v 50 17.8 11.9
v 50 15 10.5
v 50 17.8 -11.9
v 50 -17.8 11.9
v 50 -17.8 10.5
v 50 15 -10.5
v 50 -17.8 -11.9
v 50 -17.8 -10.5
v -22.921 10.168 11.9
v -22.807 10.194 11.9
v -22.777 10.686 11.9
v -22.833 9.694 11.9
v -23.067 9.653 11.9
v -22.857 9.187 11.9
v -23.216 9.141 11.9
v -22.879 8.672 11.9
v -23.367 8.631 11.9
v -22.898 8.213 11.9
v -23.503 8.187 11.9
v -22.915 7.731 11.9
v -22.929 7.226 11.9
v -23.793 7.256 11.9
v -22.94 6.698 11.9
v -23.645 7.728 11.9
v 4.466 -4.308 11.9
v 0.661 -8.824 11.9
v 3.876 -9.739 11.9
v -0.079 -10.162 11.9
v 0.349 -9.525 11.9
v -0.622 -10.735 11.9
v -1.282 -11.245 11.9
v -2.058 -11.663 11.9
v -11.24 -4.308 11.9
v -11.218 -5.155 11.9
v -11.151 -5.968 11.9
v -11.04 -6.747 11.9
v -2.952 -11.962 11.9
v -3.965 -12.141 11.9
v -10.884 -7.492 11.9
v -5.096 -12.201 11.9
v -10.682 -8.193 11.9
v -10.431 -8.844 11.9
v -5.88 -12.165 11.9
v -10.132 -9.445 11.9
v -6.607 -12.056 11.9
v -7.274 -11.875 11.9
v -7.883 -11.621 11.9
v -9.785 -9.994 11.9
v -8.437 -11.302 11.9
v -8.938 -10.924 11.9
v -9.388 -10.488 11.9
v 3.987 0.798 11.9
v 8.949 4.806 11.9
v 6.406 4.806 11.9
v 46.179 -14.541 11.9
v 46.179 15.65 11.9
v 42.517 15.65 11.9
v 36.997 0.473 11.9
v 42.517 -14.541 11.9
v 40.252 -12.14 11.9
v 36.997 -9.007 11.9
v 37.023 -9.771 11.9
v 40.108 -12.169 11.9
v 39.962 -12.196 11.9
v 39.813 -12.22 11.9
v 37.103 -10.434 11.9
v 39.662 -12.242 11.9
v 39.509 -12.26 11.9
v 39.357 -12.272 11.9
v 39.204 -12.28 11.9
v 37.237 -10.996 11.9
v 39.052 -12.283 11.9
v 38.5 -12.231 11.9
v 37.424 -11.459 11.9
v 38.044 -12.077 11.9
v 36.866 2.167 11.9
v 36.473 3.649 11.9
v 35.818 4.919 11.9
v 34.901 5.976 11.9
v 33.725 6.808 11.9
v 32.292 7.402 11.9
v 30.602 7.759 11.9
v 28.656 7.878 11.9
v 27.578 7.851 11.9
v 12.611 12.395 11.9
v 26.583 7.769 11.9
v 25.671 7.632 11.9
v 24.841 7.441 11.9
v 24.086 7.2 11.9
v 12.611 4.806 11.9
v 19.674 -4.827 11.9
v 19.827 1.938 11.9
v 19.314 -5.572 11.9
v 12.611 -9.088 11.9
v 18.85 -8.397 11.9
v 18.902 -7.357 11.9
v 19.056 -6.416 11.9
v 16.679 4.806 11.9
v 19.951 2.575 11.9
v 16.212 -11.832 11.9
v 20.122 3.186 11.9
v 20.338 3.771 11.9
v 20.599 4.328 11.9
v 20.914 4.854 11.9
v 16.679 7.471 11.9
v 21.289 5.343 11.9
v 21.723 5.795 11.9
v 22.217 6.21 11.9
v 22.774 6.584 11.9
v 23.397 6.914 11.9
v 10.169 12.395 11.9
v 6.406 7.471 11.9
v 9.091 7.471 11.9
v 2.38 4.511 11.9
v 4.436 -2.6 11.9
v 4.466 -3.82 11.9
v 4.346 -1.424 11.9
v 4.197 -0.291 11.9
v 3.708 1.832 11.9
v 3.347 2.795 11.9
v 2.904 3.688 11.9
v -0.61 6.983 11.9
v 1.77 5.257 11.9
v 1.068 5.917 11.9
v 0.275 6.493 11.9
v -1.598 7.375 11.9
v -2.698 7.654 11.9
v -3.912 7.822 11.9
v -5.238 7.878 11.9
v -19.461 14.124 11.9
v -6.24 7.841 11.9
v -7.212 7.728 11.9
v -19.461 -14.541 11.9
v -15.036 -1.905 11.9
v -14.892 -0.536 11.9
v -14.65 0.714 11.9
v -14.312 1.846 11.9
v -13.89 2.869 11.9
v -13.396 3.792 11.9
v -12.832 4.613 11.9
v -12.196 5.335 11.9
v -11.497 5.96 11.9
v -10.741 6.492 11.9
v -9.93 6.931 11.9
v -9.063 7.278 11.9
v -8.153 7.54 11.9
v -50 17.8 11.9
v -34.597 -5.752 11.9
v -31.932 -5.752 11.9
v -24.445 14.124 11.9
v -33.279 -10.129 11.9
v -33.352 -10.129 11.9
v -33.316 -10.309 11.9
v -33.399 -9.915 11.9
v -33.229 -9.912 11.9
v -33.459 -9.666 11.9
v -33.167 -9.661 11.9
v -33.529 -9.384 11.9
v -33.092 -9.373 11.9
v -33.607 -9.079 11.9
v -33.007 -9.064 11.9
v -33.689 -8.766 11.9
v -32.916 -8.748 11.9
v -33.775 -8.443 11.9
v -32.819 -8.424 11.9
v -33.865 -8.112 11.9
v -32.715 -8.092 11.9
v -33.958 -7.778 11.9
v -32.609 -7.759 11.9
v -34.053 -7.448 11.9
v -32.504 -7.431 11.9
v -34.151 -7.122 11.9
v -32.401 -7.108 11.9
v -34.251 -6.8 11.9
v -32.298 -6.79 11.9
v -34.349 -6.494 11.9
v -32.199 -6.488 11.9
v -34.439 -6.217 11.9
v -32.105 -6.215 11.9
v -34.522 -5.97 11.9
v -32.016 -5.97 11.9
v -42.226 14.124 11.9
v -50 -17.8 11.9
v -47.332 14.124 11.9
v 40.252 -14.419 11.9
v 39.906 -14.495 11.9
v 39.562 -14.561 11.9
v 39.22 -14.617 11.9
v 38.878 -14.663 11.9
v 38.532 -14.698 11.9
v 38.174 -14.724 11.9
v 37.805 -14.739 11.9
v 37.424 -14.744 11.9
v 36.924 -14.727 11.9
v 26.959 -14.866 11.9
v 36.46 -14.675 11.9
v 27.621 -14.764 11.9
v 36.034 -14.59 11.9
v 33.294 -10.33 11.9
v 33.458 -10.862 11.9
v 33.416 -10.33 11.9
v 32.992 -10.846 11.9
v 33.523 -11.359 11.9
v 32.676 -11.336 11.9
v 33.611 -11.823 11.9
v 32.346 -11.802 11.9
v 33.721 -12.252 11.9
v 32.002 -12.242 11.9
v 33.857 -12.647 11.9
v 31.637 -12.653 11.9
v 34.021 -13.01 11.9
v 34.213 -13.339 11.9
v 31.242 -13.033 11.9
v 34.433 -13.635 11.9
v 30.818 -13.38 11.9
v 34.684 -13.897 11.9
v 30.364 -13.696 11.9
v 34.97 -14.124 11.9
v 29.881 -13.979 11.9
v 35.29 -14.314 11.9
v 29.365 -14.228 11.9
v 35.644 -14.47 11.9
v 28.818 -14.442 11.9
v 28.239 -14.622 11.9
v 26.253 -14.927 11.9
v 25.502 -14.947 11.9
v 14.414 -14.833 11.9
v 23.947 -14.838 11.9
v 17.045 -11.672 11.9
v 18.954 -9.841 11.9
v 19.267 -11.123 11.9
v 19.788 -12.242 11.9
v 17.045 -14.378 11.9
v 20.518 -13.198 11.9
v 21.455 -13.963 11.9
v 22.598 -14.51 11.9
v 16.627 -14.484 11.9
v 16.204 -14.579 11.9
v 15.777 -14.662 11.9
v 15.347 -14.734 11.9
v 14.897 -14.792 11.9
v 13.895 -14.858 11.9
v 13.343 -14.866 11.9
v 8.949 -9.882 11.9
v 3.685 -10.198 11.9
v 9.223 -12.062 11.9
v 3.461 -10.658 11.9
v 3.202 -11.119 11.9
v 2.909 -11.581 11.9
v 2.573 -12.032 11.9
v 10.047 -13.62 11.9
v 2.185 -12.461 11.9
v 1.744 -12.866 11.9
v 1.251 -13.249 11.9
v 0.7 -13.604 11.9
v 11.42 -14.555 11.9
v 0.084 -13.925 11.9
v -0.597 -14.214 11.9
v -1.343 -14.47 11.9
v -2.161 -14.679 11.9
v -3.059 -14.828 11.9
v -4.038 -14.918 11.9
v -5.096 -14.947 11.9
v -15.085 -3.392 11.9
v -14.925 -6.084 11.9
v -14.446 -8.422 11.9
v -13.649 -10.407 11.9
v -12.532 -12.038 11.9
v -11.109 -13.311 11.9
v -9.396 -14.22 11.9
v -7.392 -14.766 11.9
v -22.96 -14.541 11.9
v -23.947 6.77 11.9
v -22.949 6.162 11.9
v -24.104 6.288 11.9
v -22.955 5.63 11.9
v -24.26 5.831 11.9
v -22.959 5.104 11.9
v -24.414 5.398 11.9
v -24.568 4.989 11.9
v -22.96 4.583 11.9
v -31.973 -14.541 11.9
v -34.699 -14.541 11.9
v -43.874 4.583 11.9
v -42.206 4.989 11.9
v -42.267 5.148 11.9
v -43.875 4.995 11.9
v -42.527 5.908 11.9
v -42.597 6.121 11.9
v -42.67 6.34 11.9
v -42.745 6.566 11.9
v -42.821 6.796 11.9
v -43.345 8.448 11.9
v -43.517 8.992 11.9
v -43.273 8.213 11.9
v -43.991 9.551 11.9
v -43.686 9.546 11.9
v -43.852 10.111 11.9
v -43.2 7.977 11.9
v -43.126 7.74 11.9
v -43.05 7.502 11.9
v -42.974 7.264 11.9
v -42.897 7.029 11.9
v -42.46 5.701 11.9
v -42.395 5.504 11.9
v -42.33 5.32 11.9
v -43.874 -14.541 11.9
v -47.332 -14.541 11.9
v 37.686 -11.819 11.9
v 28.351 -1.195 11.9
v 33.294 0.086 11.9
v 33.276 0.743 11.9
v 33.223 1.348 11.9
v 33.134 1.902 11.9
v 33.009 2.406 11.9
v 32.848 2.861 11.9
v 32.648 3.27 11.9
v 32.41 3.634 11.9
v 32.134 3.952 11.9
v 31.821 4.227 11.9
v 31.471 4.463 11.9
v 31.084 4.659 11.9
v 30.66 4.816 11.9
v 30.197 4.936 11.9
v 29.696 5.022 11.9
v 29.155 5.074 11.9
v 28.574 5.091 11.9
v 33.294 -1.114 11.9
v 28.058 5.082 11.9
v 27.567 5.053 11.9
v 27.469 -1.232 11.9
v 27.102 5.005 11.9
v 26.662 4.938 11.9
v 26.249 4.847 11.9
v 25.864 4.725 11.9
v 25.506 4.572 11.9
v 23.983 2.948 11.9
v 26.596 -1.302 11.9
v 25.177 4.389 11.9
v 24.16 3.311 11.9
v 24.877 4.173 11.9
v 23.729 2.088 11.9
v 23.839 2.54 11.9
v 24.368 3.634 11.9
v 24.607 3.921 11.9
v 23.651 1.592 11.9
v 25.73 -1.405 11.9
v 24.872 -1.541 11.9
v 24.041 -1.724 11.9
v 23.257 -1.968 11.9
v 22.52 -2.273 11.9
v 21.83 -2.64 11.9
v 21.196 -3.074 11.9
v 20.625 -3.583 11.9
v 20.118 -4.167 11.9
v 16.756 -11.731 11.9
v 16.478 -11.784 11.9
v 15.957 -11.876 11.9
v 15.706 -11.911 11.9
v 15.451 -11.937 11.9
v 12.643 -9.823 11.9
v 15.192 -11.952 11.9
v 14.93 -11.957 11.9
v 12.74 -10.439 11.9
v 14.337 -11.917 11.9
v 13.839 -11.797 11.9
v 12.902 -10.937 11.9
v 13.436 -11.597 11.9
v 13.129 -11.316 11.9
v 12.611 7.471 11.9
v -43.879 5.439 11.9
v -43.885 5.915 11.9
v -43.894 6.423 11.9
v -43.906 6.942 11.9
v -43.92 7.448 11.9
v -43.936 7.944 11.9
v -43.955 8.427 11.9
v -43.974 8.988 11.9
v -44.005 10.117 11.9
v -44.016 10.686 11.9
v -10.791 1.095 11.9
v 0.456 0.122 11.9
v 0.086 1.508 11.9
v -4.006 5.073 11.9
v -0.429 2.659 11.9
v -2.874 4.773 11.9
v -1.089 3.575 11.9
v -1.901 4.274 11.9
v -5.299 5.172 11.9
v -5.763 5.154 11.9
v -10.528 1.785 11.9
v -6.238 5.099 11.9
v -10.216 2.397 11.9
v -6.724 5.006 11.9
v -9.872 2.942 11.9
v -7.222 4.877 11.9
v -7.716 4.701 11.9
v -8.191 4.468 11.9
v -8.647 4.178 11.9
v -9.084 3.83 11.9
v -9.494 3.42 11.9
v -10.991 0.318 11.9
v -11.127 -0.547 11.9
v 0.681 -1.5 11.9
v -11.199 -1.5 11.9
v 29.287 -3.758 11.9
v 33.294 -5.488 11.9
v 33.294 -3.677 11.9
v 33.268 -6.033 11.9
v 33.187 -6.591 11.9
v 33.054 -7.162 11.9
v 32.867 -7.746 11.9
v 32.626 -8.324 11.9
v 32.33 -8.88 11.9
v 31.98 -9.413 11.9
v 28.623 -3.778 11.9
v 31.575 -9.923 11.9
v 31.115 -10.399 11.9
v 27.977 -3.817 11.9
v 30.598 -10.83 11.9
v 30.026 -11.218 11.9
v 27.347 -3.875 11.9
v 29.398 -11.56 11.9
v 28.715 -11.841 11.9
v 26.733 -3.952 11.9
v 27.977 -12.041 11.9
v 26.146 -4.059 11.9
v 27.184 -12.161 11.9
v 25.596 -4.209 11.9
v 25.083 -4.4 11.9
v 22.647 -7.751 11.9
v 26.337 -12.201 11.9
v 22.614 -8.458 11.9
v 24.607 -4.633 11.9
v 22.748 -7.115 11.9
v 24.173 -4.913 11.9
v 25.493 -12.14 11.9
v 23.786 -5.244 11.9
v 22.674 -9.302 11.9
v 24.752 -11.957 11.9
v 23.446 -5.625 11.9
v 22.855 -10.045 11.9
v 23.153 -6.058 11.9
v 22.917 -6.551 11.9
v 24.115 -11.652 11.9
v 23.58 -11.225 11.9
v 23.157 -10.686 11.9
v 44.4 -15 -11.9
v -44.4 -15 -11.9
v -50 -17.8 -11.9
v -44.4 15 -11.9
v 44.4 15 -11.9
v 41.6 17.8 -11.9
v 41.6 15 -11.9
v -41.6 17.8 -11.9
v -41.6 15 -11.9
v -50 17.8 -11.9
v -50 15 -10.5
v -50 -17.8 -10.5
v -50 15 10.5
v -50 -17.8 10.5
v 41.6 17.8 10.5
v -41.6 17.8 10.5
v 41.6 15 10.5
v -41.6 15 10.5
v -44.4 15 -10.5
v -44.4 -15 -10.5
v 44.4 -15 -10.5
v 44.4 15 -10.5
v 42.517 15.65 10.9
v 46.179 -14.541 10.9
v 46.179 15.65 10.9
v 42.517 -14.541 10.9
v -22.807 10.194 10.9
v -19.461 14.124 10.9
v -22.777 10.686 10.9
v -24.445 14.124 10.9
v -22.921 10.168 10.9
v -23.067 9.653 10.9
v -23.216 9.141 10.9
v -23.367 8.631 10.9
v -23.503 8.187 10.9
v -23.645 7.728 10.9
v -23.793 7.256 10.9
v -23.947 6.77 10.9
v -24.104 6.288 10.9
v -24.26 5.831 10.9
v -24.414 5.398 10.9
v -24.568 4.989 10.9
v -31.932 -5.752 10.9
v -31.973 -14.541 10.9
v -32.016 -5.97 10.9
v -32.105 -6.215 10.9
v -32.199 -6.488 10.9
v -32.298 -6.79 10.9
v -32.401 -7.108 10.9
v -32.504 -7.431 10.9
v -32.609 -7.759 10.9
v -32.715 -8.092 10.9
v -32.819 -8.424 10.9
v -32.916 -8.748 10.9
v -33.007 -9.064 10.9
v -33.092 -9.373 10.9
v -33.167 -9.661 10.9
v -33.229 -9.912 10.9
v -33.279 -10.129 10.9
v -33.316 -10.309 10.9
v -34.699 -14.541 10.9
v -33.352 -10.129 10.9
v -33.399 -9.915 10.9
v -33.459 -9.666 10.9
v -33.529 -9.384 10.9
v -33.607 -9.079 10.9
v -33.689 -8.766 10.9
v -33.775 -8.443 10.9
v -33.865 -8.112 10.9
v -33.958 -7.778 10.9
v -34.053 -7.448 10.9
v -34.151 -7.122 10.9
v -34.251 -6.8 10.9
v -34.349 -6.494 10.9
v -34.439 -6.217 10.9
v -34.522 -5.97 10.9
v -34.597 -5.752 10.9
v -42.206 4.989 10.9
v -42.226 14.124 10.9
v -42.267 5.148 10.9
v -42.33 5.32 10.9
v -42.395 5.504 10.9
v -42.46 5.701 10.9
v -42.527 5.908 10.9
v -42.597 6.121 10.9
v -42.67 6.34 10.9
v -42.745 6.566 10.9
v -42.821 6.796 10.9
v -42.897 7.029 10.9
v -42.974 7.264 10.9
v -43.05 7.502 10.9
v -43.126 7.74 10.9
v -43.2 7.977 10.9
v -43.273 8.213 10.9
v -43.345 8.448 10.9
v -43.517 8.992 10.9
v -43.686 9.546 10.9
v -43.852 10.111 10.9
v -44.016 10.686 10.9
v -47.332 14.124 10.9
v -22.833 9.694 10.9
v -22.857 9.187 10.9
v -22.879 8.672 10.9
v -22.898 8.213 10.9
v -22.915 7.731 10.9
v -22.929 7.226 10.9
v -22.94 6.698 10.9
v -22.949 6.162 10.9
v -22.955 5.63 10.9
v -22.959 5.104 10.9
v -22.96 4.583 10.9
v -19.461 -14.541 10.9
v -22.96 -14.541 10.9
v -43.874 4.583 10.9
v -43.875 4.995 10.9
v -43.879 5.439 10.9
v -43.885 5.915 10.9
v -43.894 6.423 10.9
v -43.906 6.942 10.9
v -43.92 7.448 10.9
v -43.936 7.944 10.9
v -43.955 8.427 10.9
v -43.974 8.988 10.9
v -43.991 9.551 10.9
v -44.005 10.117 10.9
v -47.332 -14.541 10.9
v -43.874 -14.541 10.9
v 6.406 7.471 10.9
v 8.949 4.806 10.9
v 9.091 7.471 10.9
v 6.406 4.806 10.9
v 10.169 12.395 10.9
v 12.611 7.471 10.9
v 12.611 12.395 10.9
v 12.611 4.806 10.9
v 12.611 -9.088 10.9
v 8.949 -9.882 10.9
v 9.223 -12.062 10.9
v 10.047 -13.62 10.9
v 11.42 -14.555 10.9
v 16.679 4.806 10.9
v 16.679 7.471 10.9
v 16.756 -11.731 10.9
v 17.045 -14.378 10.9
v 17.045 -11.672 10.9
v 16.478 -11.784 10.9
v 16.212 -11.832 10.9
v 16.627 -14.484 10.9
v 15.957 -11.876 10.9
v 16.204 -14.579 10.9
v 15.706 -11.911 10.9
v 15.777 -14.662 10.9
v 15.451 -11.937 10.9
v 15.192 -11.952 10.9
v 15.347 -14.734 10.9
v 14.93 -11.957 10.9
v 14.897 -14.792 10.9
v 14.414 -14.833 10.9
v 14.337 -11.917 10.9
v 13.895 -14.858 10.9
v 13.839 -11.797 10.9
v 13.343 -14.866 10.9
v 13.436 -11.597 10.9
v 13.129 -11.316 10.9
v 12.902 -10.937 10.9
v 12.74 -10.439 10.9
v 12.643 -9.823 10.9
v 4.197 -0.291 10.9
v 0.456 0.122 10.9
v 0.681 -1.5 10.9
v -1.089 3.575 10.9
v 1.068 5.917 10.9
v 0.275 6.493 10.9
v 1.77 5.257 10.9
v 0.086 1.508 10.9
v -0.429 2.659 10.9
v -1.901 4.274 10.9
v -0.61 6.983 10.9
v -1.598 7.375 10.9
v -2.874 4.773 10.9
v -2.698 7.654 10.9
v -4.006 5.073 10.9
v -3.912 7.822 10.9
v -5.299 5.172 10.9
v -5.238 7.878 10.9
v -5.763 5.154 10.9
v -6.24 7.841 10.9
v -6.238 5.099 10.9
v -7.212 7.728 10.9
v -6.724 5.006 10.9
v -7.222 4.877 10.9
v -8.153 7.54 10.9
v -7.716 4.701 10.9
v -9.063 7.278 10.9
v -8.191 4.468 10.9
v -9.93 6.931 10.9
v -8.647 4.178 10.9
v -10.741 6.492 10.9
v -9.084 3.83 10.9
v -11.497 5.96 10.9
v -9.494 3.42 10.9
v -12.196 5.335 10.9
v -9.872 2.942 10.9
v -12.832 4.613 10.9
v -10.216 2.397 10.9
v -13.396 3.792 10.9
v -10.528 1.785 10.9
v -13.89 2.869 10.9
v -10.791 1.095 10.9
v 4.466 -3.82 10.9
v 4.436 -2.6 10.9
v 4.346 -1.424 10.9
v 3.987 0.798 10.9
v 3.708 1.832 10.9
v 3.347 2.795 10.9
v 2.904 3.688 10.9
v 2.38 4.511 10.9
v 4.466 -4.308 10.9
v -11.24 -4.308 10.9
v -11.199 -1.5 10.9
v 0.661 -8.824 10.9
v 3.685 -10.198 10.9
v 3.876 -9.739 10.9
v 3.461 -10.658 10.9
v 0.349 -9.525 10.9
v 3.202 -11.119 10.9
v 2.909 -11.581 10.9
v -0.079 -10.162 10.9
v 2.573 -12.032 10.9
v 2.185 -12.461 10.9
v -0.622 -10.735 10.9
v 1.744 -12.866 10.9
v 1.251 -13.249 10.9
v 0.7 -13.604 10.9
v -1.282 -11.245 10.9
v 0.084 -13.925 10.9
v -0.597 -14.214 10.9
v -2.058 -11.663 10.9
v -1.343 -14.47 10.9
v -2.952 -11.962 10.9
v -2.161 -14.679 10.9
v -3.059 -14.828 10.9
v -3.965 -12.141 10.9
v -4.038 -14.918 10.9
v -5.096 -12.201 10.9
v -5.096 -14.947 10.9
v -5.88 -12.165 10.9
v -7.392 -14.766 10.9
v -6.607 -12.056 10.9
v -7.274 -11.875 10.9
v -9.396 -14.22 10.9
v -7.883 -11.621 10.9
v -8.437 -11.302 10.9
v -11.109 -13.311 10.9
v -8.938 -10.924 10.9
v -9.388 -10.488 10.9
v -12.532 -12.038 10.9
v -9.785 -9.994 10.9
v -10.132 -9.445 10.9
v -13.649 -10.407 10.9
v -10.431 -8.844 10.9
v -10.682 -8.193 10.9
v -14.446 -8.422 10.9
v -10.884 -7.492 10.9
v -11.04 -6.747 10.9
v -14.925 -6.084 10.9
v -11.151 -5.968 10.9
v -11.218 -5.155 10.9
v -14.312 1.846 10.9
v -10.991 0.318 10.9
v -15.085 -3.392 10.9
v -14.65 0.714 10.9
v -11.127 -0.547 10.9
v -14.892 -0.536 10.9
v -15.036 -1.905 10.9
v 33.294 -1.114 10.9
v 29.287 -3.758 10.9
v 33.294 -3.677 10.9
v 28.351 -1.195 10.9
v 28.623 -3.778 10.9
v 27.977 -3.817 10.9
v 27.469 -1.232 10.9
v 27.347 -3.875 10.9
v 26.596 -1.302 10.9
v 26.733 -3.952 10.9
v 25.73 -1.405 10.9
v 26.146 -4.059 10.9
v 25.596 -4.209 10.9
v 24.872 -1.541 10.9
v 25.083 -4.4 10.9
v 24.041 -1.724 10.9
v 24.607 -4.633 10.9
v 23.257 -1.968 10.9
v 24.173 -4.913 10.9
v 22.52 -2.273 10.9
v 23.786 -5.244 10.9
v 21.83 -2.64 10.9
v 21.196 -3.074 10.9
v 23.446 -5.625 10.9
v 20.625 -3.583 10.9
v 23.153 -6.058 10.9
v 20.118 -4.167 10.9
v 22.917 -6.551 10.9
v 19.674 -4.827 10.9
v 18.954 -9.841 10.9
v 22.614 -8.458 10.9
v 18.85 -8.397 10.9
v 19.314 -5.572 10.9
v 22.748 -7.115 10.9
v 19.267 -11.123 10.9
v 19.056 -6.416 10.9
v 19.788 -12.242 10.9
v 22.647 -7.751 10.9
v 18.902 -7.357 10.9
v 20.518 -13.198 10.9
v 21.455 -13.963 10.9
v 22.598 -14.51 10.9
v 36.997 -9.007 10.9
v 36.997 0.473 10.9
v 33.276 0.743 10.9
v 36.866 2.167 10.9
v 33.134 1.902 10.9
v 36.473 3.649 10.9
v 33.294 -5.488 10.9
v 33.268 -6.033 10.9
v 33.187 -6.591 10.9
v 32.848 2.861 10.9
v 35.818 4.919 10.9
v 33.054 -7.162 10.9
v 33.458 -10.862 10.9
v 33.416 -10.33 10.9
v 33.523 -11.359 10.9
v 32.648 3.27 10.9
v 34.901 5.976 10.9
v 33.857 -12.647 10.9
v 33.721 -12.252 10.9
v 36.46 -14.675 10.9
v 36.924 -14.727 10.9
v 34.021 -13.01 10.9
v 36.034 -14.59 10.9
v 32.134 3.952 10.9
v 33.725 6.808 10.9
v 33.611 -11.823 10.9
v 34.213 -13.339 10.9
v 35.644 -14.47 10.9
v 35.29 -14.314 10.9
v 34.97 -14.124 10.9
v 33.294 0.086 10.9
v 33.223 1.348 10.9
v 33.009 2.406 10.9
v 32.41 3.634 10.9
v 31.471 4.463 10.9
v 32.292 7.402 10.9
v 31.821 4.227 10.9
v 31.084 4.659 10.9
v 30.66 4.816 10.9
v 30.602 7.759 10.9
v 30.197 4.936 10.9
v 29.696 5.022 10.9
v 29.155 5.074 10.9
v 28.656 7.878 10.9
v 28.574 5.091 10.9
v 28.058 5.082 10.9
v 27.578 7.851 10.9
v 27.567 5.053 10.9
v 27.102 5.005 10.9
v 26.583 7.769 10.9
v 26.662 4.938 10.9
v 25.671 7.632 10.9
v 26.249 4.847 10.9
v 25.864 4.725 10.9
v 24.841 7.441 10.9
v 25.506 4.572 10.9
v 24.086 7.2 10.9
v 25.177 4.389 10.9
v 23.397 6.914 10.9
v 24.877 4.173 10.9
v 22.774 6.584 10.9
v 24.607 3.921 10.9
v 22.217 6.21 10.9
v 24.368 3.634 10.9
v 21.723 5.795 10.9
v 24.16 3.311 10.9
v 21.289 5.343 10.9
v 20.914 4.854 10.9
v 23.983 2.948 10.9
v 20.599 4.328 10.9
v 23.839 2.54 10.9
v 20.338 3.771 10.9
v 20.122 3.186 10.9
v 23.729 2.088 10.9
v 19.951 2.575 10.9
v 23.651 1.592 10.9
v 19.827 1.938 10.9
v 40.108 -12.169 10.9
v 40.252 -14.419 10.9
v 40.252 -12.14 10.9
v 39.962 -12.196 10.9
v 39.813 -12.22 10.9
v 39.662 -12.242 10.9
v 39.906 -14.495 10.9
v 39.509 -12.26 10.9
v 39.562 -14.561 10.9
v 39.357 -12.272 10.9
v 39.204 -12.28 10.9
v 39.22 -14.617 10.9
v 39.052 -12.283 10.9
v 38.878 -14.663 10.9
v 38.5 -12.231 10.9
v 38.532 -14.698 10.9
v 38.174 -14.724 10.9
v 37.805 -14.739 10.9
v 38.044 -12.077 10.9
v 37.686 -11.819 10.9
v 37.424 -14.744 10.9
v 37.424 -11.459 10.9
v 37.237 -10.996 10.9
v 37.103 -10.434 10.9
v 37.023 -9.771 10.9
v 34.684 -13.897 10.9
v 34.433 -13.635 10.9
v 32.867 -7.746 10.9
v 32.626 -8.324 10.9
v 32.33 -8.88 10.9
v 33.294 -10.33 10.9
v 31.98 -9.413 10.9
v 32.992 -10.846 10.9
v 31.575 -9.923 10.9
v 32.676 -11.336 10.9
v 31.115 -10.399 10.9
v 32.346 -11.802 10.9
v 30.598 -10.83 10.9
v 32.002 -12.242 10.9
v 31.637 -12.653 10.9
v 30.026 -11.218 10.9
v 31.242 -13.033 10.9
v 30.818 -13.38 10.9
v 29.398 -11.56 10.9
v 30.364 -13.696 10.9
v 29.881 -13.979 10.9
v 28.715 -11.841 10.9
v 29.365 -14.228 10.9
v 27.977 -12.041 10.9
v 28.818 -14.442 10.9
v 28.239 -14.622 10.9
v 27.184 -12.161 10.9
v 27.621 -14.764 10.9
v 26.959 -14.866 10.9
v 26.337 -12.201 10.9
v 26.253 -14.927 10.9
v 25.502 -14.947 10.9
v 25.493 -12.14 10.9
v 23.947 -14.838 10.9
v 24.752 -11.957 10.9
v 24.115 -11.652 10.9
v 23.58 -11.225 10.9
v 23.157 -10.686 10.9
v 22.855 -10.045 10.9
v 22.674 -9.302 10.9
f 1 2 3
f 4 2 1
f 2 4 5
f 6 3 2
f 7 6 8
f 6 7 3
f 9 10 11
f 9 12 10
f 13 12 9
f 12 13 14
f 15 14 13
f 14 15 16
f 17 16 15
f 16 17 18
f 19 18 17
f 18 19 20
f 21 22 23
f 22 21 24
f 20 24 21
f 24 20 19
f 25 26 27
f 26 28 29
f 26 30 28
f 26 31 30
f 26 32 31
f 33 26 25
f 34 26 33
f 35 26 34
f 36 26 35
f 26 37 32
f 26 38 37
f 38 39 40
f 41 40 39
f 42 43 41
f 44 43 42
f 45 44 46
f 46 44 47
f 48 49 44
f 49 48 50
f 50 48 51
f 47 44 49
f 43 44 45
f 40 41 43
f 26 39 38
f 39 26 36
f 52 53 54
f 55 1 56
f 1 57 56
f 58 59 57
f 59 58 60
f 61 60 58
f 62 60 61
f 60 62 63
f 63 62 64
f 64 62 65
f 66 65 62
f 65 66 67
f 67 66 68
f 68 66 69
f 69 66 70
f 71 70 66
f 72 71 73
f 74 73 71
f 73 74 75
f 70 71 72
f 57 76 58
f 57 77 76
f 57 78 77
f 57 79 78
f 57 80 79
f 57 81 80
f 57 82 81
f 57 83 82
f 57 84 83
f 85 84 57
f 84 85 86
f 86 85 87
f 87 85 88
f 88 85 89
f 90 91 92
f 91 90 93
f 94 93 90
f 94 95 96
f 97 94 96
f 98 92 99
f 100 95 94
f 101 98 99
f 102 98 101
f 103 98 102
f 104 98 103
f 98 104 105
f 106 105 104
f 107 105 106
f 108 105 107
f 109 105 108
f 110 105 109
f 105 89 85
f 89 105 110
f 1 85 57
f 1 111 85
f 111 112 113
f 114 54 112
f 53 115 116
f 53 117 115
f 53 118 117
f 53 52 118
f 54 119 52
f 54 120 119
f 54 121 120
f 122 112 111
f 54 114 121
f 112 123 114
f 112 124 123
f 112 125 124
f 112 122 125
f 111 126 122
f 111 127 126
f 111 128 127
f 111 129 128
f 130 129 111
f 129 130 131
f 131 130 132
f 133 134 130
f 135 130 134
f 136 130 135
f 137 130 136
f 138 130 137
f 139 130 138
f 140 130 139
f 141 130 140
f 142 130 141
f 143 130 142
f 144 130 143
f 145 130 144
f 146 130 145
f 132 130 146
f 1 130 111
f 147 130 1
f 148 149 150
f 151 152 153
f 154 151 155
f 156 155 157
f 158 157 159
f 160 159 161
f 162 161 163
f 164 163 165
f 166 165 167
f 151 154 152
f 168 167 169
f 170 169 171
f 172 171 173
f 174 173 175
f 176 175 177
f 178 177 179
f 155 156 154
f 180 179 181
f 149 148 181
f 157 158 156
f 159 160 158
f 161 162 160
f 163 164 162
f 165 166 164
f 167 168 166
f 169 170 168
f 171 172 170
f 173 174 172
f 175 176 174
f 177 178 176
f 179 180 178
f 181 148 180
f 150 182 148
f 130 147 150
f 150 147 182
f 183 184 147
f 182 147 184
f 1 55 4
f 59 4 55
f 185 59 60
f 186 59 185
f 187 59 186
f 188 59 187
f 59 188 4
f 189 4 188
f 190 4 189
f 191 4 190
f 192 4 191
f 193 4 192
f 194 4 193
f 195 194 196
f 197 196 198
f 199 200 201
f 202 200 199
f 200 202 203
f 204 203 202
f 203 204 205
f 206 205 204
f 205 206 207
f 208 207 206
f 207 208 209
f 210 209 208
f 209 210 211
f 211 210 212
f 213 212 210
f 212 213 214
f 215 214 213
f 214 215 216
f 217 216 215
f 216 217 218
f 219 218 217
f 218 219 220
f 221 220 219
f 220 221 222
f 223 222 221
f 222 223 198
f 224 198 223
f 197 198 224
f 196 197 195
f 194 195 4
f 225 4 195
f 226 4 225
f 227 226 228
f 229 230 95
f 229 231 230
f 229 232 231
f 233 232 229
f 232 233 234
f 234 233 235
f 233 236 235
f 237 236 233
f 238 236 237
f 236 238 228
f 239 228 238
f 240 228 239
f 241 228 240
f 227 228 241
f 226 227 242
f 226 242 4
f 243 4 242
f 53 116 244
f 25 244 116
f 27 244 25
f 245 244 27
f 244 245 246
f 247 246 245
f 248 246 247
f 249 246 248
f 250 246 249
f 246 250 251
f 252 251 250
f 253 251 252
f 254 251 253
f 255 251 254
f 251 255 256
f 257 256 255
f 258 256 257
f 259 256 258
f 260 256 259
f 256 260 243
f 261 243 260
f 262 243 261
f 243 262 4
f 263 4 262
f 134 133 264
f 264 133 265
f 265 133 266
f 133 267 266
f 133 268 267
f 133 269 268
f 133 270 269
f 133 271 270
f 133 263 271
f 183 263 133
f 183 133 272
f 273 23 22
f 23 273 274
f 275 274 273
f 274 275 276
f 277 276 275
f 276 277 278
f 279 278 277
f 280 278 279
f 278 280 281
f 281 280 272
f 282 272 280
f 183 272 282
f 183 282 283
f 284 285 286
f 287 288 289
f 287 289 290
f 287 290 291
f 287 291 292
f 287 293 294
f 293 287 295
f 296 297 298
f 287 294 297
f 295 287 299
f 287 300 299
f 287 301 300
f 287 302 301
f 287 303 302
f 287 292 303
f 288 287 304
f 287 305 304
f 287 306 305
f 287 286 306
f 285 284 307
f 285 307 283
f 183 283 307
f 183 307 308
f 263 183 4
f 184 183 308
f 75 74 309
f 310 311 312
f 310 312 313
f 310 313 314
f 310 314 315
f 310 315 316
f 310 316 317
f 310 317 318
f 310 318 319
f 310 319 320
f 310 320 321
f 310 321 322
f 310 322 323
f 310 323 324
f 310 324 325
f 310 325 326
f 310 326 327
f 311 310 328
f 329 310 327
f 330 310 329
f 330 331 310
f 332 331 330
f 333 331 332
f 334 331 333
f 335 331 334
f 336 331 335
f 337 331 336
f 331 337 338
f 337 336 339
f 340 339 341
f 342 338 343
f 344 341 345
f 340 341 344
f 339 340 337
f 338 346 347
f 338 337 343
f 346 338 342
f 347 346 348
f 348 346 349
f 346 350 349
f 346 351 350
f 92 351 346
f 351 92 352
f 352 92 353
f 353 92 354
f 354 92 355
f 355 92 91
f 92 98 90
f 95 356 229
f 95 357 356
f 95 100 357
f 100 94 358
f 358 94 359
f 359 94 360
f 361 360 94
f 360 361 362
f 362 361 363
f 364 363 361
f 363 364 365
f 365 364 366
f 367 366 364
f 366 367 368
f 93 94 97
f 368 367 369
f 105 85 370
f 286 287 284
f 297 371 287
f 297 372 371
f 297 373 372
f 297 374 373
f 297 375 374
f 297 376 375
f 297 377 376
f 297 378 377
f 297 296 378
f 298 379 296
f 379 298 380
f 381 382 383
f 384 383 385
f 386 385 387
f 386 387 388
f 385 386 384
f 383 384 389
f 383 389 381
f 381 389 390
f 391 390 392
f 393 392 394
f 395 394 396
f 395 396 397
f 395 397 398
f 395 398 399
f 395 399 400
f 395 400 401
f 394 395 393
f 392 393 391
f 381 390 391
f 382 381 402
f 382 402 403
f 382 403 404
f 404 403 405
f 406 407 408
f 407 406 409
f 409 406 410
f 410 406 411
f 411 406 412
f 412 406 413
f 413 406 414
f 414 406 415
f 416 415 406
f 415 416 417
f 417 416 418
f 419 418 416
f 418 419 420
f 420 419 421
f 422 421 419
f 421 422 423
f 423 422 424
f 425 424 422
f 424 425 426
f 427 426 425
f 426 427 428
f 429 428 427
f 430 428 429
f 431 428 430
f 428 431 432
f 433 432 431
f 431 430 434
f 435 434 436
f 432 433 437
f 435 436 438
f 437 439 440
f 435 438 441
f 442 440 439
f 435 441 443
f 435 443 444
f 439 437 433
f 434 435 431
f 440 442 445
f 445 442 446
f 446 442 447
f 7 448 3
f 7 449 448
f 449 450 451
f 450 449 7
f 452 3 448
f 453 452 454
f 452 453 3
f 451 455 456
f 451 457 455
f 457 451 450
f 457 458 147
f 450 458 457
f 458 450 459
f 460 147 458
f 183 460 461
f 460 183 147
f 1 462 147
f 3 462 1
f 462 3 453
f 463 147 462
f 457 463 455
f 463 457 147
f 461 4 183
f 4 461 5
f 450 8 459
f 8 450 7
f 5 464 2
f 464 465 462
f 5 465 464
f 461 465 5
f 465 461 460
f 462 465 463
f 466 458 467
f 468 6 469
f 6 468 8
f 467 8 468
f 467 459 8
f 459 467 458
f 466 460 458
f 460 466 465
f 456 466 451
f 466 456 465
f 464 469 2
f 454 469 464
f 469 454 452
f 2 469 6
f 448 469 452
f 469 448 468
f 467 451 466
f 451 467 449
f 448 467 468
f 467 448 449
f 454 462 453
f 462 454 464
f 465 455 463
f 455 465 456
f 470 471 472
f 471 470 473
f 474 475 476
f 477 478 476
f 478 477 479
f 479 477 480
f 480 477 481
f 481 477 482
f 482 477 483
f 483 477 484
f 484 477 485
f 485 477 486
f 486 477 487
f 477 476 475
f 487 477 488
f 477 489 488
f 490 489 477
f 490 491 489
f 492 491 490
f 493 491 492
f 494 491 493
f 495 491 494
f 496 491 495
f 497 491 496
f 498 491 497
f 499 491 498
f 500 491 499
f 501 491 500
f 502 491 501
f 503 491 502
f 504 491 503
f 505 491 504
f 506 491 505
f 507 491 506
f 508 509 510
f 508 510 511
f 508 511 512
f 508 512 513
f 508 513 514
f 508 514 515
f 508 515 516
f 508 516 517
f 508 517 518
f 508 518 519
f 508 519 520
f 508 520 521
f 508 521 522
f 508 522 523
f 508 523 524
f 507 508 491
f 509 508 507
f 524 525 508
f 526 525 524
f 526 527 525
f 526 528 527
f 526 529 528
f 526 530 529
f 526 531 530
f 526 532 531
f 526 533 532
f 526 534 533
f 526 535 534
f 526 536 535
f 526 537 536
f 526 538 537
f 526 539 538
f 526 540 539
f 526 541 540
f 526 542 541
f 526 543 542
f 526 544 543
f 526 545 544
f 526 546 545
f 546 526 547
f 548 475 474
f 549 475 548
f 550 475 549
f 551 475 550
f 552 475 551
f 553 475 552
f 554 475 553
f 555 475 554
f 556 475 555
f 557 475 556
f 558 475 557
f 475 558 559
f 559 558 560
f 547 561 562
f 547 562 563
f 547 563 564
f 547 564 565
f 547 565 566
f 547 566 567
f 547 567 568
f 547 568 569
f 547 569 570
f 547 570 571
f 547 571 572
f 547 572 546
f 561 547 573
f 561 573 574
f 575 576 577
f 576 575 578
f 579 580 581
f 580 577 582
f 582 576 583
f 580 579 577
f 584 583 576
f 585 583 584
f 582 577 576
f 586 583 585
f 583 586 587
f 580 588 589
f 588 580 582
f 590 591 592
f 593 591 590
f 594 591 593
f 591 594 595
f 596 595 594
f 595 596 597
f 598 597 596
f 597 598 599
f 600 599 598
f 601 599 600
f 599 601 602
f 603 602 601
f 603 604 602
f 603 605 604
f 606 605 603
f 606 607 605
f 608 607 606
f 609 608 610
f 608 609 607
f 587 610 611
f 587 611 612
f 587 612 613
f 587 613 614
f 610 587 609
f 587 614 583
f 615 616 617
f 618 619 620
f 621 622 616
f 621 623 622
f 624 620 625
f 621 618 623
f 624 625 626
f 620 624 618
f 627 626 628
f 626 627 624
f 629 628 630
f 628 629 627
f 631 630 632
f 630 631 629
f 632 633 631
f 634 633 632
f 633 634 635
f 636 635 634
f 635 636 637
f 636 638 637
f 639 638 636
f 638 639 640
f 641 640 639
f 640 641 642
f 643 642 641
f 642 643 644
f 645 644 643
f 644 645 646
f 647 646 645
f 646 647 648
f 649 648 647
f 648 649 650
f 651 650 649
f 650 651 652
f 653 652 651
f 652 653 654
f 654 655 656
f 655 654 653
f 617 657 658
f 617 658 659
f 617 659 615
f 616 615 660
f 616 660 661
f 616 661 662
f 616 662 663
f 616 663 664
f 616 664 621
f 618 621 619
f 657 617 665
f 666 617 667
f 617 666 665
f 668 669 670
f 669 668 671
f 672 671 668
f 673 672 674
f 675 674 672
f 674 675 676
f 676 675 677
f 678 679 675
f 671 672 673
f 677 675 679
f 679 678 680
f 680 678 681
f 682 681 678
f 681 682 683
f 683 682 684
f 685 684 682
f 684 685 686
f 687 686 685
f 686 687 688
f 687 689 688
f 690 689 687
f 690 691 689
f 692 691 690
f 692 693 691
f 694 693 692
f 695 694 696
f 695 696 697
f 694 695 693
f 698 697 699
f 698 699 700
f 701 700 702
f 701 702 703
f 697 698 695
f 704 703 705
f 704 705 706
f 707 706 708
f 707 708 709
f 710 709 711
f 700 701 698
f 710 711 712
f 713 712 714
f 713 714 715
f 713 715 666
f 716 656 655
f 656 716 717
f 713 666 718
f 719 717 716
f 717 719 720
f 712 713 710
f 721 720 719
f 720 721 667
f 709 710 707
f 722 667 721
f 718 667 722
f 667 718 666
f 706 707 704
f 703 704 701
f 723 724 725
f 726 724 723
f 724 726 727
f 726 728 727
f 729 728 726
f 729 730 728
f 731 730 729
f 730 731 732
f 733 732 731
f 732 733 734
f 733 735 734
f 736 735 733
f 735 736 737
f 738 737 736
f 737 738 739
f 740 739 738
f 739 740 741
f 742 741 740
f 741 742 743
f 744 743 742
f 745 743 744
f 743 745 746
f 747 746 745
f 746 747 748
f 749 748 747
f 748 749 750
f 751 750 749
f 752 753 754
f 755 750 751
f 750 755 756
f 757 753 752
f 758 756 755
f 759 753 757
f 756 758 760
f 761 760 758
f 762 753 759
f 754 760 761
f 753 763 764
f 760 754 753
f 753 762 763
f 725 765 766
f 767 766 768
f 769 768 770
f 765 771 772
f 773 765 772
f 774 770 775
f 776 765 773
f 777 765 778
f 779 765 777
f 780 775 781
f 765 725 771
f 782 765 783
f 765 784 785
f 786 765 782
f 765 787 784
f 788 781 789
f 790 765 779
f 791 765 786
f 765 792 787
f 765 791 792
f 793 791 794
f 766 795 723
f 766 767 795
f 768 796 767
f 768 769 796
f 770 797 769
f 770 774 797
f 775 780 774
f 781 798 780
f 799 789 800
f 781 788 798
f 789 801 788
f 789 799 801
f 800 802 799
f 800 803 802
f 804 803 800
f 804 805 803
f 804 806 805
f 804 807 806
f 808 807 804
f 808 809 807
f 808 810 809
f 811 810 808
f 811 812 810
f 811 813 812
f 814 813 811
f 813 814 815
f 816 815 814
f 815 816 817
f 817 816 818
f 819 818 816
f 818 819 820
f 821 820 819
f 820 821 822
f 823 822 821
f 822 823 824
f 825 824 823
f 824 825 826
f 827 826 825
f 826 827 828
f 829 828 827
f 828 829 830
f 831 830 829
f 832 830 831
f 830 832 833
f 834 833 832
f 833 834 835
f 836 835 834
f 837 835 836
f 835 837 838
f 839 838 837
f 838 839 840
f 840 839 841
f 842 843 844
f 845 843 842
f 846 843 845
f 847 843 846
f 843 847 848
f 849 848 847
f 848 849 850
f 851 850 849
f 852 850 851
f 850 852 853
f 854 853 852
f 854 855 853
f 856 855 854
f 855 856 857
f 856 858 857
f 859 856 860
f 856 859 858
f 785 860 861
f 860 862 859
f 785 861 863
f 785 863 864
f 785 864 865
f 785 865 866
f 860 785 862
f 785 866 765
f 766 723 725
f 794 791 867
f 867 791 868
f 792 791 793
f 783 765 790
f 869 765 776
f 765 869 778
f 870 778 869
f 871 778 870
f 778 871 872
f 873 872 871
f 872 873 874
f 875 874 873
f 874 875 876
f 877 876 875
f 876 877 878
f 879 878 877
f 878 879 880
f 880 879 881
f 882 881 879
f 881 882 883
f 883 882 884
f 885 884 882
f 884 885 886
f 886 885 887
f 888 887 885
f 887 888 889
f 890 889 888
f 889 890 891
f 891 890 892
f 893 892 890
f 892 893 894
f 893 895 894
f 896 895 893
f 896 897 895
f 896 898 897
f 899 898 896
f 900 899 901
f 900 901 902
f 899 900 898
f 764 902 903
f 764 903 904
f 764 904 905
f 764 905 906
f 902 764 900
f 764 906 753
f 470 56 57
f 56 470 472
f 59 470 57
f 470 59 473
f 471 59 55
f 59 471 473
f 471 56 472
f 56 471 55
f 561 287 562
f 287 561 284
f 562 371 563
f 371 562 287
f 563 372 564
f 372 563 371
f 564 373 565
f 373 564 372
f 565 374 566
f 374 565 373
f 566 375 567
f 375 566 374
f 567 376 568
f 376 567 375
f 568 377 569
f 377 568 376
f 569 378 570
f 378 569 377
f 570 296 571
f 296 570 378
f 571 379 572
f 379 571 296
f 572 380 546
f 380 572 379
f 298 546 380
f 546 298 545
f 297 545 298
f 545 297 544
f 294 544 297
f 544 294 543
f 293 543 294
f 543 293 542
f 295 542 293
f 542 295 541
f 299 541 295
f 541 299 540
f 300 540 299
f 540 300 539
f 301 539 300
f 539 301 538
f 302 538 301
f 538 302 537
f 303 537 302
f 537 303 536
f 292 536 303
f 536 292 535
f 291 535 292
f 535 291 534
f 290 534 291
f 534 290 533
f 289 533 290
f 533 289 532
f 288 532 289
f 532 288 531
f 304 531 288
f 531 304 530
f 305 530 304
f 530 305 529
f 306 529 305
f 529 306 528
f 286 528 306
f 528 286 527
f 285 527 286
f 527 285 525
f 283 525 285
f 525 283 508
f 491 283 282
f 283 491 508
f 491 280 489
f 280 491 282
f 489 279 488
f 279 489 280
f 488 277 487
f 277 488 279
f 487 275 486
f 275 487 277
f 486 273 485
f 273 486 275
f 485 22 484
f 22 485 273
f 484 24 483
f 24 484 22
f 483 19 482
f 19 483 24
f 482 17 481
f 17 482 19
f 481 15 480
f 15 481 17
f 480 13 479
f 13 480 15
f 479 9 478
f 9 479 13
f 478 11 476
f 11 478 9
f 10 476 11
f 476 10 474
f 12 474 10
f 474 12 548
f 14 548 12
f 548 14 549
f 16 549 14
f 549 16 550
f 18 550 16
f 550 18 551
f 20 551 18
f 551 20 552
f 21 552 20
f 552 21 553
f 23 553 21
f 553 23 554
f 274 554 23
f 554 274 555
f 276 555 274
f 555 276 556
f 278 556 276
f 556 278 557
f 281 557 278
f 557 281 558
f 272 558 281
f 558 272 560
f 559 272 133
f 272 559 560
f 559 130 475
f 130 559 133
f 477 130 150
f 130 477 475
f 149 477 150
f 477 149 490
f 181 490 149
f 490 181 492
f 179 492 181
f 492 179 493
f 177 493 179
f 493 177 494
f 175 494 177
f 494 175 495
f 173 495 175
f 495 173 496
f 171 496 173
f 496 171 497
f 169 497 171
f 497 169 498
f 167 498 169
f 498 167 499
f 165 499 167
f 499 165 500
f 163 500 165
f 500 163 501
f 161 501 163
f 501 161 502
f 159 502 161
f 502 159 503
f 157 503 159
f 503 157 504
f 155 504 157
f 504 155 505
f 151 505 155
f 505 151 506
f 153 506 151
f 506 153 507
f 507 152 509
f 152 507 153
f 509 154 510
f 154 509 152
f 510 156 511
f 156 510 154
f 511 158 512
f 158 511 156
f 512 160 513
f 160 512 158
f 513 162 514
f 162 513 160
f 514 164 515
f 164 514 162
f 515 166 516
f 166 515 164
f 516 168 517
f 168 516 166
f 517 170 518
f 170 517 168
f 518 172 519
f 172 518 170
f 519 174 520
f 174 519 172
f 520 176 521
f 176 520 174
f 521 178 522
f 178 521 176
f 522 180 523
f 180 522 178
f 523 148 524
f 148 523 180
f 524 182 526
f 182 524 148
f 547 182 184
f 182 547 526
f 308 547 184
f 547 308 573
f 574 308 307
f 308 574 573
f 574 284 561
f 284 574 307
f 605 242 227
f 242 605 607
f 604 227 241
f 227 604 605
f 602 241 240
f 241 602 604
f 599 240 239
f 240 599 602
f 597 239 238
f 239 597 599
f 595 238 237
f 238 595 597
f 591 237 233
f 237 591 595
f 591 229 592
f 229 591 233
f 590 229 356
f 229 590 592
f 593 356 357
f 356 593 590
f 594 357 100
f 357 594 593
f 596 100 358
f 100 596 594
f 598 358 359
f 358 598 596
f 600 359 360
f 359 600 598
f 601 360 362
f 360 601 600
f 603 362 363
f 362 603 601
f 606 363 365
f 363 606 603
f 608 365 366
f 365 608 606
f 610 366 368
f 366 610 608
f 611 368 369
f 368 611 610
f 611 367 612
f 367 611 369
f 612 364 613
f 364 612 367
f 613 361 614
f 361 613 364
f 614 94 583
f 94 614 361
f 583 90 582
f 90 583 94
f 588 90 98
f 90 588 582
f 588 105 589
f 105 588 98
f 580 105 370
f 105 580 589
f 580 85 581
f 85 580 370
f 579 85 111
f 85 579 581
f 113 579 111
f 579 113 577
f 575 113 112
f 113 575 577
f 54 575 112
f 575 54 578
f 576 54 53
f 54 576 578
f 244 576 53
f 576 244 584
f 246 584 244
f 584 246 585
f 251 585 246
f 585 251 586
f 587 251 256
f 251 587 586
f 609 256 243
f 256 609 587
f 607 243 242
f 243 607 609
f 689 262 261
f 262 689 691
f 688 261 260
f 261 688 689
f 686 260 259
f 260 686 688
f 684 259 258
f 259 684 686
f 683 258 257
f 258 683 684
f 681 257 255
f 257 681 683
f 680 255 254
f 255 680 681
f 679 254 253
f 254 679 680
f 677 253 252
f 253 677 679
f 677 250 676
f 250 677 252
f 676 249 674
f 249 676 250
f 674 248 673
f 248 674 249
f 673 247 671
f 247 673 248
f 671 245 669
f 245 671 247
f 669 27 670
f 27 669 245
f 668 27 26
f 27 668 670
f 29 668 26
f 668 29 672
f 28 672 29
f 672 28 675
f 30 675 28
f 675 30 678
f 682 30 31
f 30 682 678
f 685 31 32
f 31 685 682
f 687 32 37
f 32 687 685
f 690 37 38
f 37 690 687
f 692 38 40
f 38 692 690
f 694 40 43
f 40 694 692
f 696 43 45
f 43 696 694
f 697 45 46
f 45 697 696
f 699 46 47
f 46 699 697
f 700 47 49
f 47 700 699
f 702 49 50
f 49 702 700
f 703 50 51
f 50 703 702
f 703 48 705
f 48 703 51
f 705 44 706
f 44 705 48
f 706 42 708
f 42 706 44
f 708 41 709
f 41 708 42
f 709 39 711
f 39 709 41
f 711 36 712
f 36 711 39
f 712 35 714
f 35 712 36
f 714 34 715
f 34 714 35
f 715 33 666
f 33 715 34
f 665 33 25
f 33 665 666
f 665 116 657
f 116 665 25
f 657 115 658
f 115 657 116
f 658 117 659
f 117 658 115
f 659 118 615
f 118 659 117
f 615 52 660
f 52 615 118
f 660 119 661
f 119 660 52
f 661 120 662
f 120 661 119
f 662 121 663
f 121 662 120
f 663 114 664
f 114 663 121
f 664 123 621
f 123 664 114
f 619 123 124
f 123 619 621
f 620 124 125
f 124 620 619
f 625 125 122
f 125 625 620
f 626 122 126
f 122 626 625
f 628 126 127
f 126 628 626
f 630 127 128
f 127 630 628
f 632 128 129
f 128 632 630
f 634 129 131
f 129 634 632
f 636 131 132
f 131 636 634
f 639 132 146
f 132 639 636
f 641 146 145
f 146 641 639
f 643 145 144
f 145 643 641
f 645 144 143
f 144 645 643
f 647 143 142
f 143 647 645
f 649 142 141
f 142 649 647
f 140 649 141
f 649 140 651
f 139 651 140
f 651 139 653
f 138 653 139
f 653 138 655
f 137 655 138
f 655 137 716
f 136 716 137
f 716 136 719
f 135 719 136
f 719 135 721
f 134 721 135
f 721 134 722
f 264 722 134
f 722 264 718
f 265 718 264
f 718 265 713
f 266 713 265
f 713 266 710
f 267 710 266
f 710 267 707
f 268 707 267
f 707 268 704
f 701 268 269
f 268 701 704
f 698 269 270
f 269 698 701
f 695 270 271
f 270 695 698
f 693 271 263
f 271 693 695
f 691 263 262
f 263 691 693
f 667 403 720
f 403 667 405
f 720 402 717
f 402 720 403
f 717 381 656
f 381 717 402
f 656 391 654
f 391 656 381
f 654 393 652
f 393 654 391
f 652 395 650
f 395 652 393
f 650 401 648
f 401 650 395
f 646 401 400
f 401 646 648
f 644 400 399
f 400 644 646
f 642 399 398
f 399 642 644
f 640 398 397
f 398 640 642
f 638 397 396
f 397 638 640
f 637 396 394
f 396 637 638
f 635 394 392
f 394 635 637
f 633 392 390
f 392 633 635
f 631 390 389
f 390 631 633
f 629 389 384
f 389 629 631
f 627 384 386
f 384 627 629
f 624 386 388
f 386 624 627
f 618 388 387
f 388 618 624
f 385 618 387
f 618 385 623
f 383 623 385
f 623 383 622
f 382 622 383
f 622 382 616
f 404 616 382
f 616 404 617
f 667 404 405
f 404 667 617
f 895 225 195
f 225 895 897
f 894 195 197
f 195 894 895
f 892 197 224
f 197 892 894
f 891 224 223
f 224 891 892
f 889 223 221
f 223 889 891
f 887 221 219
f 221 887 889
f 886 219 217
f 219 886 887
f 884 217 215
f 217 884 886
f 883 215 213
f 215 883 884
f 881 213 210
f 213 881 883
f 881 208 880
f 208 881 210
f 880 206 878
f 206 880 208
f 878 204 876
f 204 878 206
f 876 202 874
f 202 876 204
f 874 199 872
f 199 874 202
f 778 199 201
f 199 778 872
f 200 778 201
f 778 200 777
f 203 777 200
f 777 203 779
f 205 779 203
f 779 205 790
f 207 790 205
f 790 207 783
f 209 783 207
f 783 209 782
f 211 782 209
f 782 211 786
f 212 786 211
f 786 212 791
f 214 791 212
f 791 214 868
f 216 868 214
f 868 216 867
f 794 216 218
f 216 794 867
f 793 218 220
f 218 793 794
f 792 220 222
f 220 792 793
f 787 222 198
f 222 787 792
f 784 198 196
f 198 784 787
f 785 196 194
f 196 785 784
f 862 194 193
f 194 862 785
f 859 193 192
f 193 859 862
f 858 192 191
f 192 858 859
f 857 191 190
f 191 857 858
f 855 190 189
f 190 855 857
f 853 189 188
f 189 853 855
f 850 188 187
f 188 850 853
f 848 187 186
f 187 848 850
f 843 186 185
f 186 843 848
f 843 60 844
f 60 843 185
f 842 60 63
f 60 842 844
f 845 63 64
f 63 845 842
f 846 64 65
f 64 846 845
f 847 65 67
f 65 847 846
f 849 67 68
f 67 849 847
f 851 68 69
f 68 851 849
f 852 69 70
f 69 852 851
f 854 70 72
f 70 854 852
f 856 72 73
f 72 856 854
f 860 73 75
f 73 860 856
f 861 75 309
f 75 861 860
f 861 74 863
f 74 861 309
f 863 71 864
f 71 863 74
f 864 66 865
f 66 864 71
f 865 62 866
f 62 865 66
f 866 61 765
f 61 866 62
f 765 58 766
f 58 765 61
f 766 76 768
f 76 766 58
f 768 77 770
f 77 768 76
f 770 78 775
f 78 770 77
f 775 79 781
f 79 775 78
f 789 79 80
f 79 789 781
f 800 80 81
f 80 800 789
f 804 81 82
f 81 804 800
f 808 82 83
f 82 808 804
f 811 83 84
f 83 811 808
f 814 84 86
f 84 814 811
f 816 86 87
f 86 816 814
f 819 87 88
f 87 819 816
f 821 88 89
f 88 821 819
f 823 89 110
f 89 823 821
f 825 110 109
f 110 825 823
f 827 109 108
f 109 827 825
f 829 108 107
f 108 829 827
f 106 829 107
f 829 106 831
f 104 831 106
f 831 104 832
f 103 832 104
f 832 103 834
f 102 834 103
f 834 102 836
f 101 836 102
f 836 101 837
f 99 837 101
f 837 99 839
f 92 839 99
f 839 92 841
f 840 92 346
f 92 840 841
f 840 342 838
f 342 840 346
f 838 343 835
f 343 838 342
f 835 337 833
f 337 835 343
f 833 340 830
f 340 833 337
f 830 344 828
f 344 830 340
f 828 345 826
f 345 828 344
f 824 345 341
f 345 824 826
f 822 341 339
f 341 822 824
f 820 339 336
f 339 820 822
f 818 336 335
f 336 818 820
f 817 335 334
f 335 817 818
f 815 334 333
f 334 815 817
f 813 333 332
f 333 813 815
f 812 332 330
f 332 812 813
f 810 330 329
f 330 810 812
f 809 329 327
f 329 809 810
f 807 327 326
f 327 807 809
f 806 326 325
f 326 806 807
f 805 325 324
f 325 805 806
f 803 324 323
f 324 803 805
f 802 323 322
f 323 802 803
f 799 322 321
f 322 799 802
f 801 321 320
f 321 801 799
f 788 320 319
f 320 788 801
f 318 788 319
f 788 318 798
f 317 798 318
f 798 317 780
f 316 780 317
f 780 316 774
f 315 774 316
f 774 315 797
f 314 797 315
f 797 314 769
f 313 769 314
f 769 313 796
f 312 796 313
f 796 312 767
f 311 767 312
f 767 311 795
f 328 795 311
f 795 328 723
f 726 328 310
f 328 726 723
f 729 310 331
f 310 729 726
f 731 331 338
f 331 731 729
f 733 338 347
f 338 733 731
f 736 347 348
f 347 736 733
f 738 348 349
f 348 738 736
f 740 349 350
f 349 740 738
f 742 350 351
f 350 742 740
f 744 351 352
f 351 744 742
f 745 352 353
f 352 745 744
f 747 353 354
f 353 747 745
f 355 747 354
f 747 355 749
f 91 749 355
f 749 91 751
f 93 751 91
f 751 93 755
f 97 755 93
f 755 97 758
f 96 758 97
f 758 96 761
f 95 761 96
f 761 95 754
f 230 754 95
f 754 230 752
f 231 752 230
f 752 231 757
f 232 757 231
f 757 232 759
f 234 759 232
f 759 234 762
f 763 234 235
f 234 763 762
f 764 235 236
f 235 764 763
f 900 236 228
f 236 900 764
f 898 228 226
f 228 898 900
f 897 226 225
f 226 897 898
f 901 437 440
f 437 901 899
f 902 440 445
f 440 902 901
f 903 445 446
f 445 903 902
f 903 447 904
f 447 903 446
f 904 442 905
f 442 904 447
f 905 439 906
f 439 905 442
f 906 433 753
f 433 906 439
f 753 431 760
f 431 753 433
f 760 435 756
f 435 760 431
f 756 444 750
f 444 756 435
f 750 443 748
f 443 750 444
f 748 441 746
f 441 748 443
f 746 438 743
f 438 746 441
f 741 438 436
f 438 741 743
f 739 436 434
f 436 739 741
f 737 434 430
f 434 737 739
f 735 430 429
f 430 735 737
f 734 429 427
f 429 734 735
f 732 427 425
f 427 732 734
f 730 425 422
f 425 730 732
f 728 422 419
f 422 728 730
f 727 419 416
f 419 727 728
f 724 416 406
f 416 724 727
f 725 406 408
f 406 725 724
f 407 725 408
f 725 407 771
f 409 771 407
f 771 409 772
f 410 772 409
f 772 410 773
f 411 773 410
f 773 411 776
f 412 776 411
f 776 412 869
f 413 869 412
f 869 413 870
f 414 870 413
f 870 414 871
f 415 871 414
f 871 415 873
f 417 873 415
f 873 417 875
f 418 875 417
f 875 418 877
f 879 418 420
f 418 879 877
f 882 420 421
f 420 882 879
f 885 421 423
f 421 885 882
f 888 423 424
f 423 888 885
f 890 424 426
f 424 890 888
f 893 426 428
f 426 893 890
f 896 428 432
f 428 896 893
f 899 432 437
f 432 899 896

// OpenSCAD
/*[Global]*/

//The length of the sign
sign_length=100; // [300]

//Text size
text_size=30; // [100]

//Thickness of the sign
thickness=2.8;	

//Thickness of the door
door_thickness=21;

//Text
sign_text="Metal";

//Make the sign face down for easier printing
Face_down=0; //[0:False, 180:True]


rotate([Face_down,0,0])
difference(){
	cube([sign_length, text_size+ thickness*2, door_thickness+thickness], center=true);
	translate([0,-thickness,0])
		cube([sign_length+thickness*2, text_size+thickness*2, door_thickness], center=true);
	translate([0,0,-(door_thickness+thickness)/2])
		cube([sign_length-thickness*4, text_size, thickness+0.2], center=true);
	translate([0,(text_size+thickness)/2,-(thickness+0.1)/2])
		cube([sign_length-thickness*6, thickness+0.2, door_thickness+ thickness+0.1], center=true);
translate([-1,0,(door_thickness+thickness)/2+0.4])
	linear_extrude(height=thickness, center=true, convexity=10, twist=0) 
		text(sign_text,size=text_size, halign="center",valign="center");
}
